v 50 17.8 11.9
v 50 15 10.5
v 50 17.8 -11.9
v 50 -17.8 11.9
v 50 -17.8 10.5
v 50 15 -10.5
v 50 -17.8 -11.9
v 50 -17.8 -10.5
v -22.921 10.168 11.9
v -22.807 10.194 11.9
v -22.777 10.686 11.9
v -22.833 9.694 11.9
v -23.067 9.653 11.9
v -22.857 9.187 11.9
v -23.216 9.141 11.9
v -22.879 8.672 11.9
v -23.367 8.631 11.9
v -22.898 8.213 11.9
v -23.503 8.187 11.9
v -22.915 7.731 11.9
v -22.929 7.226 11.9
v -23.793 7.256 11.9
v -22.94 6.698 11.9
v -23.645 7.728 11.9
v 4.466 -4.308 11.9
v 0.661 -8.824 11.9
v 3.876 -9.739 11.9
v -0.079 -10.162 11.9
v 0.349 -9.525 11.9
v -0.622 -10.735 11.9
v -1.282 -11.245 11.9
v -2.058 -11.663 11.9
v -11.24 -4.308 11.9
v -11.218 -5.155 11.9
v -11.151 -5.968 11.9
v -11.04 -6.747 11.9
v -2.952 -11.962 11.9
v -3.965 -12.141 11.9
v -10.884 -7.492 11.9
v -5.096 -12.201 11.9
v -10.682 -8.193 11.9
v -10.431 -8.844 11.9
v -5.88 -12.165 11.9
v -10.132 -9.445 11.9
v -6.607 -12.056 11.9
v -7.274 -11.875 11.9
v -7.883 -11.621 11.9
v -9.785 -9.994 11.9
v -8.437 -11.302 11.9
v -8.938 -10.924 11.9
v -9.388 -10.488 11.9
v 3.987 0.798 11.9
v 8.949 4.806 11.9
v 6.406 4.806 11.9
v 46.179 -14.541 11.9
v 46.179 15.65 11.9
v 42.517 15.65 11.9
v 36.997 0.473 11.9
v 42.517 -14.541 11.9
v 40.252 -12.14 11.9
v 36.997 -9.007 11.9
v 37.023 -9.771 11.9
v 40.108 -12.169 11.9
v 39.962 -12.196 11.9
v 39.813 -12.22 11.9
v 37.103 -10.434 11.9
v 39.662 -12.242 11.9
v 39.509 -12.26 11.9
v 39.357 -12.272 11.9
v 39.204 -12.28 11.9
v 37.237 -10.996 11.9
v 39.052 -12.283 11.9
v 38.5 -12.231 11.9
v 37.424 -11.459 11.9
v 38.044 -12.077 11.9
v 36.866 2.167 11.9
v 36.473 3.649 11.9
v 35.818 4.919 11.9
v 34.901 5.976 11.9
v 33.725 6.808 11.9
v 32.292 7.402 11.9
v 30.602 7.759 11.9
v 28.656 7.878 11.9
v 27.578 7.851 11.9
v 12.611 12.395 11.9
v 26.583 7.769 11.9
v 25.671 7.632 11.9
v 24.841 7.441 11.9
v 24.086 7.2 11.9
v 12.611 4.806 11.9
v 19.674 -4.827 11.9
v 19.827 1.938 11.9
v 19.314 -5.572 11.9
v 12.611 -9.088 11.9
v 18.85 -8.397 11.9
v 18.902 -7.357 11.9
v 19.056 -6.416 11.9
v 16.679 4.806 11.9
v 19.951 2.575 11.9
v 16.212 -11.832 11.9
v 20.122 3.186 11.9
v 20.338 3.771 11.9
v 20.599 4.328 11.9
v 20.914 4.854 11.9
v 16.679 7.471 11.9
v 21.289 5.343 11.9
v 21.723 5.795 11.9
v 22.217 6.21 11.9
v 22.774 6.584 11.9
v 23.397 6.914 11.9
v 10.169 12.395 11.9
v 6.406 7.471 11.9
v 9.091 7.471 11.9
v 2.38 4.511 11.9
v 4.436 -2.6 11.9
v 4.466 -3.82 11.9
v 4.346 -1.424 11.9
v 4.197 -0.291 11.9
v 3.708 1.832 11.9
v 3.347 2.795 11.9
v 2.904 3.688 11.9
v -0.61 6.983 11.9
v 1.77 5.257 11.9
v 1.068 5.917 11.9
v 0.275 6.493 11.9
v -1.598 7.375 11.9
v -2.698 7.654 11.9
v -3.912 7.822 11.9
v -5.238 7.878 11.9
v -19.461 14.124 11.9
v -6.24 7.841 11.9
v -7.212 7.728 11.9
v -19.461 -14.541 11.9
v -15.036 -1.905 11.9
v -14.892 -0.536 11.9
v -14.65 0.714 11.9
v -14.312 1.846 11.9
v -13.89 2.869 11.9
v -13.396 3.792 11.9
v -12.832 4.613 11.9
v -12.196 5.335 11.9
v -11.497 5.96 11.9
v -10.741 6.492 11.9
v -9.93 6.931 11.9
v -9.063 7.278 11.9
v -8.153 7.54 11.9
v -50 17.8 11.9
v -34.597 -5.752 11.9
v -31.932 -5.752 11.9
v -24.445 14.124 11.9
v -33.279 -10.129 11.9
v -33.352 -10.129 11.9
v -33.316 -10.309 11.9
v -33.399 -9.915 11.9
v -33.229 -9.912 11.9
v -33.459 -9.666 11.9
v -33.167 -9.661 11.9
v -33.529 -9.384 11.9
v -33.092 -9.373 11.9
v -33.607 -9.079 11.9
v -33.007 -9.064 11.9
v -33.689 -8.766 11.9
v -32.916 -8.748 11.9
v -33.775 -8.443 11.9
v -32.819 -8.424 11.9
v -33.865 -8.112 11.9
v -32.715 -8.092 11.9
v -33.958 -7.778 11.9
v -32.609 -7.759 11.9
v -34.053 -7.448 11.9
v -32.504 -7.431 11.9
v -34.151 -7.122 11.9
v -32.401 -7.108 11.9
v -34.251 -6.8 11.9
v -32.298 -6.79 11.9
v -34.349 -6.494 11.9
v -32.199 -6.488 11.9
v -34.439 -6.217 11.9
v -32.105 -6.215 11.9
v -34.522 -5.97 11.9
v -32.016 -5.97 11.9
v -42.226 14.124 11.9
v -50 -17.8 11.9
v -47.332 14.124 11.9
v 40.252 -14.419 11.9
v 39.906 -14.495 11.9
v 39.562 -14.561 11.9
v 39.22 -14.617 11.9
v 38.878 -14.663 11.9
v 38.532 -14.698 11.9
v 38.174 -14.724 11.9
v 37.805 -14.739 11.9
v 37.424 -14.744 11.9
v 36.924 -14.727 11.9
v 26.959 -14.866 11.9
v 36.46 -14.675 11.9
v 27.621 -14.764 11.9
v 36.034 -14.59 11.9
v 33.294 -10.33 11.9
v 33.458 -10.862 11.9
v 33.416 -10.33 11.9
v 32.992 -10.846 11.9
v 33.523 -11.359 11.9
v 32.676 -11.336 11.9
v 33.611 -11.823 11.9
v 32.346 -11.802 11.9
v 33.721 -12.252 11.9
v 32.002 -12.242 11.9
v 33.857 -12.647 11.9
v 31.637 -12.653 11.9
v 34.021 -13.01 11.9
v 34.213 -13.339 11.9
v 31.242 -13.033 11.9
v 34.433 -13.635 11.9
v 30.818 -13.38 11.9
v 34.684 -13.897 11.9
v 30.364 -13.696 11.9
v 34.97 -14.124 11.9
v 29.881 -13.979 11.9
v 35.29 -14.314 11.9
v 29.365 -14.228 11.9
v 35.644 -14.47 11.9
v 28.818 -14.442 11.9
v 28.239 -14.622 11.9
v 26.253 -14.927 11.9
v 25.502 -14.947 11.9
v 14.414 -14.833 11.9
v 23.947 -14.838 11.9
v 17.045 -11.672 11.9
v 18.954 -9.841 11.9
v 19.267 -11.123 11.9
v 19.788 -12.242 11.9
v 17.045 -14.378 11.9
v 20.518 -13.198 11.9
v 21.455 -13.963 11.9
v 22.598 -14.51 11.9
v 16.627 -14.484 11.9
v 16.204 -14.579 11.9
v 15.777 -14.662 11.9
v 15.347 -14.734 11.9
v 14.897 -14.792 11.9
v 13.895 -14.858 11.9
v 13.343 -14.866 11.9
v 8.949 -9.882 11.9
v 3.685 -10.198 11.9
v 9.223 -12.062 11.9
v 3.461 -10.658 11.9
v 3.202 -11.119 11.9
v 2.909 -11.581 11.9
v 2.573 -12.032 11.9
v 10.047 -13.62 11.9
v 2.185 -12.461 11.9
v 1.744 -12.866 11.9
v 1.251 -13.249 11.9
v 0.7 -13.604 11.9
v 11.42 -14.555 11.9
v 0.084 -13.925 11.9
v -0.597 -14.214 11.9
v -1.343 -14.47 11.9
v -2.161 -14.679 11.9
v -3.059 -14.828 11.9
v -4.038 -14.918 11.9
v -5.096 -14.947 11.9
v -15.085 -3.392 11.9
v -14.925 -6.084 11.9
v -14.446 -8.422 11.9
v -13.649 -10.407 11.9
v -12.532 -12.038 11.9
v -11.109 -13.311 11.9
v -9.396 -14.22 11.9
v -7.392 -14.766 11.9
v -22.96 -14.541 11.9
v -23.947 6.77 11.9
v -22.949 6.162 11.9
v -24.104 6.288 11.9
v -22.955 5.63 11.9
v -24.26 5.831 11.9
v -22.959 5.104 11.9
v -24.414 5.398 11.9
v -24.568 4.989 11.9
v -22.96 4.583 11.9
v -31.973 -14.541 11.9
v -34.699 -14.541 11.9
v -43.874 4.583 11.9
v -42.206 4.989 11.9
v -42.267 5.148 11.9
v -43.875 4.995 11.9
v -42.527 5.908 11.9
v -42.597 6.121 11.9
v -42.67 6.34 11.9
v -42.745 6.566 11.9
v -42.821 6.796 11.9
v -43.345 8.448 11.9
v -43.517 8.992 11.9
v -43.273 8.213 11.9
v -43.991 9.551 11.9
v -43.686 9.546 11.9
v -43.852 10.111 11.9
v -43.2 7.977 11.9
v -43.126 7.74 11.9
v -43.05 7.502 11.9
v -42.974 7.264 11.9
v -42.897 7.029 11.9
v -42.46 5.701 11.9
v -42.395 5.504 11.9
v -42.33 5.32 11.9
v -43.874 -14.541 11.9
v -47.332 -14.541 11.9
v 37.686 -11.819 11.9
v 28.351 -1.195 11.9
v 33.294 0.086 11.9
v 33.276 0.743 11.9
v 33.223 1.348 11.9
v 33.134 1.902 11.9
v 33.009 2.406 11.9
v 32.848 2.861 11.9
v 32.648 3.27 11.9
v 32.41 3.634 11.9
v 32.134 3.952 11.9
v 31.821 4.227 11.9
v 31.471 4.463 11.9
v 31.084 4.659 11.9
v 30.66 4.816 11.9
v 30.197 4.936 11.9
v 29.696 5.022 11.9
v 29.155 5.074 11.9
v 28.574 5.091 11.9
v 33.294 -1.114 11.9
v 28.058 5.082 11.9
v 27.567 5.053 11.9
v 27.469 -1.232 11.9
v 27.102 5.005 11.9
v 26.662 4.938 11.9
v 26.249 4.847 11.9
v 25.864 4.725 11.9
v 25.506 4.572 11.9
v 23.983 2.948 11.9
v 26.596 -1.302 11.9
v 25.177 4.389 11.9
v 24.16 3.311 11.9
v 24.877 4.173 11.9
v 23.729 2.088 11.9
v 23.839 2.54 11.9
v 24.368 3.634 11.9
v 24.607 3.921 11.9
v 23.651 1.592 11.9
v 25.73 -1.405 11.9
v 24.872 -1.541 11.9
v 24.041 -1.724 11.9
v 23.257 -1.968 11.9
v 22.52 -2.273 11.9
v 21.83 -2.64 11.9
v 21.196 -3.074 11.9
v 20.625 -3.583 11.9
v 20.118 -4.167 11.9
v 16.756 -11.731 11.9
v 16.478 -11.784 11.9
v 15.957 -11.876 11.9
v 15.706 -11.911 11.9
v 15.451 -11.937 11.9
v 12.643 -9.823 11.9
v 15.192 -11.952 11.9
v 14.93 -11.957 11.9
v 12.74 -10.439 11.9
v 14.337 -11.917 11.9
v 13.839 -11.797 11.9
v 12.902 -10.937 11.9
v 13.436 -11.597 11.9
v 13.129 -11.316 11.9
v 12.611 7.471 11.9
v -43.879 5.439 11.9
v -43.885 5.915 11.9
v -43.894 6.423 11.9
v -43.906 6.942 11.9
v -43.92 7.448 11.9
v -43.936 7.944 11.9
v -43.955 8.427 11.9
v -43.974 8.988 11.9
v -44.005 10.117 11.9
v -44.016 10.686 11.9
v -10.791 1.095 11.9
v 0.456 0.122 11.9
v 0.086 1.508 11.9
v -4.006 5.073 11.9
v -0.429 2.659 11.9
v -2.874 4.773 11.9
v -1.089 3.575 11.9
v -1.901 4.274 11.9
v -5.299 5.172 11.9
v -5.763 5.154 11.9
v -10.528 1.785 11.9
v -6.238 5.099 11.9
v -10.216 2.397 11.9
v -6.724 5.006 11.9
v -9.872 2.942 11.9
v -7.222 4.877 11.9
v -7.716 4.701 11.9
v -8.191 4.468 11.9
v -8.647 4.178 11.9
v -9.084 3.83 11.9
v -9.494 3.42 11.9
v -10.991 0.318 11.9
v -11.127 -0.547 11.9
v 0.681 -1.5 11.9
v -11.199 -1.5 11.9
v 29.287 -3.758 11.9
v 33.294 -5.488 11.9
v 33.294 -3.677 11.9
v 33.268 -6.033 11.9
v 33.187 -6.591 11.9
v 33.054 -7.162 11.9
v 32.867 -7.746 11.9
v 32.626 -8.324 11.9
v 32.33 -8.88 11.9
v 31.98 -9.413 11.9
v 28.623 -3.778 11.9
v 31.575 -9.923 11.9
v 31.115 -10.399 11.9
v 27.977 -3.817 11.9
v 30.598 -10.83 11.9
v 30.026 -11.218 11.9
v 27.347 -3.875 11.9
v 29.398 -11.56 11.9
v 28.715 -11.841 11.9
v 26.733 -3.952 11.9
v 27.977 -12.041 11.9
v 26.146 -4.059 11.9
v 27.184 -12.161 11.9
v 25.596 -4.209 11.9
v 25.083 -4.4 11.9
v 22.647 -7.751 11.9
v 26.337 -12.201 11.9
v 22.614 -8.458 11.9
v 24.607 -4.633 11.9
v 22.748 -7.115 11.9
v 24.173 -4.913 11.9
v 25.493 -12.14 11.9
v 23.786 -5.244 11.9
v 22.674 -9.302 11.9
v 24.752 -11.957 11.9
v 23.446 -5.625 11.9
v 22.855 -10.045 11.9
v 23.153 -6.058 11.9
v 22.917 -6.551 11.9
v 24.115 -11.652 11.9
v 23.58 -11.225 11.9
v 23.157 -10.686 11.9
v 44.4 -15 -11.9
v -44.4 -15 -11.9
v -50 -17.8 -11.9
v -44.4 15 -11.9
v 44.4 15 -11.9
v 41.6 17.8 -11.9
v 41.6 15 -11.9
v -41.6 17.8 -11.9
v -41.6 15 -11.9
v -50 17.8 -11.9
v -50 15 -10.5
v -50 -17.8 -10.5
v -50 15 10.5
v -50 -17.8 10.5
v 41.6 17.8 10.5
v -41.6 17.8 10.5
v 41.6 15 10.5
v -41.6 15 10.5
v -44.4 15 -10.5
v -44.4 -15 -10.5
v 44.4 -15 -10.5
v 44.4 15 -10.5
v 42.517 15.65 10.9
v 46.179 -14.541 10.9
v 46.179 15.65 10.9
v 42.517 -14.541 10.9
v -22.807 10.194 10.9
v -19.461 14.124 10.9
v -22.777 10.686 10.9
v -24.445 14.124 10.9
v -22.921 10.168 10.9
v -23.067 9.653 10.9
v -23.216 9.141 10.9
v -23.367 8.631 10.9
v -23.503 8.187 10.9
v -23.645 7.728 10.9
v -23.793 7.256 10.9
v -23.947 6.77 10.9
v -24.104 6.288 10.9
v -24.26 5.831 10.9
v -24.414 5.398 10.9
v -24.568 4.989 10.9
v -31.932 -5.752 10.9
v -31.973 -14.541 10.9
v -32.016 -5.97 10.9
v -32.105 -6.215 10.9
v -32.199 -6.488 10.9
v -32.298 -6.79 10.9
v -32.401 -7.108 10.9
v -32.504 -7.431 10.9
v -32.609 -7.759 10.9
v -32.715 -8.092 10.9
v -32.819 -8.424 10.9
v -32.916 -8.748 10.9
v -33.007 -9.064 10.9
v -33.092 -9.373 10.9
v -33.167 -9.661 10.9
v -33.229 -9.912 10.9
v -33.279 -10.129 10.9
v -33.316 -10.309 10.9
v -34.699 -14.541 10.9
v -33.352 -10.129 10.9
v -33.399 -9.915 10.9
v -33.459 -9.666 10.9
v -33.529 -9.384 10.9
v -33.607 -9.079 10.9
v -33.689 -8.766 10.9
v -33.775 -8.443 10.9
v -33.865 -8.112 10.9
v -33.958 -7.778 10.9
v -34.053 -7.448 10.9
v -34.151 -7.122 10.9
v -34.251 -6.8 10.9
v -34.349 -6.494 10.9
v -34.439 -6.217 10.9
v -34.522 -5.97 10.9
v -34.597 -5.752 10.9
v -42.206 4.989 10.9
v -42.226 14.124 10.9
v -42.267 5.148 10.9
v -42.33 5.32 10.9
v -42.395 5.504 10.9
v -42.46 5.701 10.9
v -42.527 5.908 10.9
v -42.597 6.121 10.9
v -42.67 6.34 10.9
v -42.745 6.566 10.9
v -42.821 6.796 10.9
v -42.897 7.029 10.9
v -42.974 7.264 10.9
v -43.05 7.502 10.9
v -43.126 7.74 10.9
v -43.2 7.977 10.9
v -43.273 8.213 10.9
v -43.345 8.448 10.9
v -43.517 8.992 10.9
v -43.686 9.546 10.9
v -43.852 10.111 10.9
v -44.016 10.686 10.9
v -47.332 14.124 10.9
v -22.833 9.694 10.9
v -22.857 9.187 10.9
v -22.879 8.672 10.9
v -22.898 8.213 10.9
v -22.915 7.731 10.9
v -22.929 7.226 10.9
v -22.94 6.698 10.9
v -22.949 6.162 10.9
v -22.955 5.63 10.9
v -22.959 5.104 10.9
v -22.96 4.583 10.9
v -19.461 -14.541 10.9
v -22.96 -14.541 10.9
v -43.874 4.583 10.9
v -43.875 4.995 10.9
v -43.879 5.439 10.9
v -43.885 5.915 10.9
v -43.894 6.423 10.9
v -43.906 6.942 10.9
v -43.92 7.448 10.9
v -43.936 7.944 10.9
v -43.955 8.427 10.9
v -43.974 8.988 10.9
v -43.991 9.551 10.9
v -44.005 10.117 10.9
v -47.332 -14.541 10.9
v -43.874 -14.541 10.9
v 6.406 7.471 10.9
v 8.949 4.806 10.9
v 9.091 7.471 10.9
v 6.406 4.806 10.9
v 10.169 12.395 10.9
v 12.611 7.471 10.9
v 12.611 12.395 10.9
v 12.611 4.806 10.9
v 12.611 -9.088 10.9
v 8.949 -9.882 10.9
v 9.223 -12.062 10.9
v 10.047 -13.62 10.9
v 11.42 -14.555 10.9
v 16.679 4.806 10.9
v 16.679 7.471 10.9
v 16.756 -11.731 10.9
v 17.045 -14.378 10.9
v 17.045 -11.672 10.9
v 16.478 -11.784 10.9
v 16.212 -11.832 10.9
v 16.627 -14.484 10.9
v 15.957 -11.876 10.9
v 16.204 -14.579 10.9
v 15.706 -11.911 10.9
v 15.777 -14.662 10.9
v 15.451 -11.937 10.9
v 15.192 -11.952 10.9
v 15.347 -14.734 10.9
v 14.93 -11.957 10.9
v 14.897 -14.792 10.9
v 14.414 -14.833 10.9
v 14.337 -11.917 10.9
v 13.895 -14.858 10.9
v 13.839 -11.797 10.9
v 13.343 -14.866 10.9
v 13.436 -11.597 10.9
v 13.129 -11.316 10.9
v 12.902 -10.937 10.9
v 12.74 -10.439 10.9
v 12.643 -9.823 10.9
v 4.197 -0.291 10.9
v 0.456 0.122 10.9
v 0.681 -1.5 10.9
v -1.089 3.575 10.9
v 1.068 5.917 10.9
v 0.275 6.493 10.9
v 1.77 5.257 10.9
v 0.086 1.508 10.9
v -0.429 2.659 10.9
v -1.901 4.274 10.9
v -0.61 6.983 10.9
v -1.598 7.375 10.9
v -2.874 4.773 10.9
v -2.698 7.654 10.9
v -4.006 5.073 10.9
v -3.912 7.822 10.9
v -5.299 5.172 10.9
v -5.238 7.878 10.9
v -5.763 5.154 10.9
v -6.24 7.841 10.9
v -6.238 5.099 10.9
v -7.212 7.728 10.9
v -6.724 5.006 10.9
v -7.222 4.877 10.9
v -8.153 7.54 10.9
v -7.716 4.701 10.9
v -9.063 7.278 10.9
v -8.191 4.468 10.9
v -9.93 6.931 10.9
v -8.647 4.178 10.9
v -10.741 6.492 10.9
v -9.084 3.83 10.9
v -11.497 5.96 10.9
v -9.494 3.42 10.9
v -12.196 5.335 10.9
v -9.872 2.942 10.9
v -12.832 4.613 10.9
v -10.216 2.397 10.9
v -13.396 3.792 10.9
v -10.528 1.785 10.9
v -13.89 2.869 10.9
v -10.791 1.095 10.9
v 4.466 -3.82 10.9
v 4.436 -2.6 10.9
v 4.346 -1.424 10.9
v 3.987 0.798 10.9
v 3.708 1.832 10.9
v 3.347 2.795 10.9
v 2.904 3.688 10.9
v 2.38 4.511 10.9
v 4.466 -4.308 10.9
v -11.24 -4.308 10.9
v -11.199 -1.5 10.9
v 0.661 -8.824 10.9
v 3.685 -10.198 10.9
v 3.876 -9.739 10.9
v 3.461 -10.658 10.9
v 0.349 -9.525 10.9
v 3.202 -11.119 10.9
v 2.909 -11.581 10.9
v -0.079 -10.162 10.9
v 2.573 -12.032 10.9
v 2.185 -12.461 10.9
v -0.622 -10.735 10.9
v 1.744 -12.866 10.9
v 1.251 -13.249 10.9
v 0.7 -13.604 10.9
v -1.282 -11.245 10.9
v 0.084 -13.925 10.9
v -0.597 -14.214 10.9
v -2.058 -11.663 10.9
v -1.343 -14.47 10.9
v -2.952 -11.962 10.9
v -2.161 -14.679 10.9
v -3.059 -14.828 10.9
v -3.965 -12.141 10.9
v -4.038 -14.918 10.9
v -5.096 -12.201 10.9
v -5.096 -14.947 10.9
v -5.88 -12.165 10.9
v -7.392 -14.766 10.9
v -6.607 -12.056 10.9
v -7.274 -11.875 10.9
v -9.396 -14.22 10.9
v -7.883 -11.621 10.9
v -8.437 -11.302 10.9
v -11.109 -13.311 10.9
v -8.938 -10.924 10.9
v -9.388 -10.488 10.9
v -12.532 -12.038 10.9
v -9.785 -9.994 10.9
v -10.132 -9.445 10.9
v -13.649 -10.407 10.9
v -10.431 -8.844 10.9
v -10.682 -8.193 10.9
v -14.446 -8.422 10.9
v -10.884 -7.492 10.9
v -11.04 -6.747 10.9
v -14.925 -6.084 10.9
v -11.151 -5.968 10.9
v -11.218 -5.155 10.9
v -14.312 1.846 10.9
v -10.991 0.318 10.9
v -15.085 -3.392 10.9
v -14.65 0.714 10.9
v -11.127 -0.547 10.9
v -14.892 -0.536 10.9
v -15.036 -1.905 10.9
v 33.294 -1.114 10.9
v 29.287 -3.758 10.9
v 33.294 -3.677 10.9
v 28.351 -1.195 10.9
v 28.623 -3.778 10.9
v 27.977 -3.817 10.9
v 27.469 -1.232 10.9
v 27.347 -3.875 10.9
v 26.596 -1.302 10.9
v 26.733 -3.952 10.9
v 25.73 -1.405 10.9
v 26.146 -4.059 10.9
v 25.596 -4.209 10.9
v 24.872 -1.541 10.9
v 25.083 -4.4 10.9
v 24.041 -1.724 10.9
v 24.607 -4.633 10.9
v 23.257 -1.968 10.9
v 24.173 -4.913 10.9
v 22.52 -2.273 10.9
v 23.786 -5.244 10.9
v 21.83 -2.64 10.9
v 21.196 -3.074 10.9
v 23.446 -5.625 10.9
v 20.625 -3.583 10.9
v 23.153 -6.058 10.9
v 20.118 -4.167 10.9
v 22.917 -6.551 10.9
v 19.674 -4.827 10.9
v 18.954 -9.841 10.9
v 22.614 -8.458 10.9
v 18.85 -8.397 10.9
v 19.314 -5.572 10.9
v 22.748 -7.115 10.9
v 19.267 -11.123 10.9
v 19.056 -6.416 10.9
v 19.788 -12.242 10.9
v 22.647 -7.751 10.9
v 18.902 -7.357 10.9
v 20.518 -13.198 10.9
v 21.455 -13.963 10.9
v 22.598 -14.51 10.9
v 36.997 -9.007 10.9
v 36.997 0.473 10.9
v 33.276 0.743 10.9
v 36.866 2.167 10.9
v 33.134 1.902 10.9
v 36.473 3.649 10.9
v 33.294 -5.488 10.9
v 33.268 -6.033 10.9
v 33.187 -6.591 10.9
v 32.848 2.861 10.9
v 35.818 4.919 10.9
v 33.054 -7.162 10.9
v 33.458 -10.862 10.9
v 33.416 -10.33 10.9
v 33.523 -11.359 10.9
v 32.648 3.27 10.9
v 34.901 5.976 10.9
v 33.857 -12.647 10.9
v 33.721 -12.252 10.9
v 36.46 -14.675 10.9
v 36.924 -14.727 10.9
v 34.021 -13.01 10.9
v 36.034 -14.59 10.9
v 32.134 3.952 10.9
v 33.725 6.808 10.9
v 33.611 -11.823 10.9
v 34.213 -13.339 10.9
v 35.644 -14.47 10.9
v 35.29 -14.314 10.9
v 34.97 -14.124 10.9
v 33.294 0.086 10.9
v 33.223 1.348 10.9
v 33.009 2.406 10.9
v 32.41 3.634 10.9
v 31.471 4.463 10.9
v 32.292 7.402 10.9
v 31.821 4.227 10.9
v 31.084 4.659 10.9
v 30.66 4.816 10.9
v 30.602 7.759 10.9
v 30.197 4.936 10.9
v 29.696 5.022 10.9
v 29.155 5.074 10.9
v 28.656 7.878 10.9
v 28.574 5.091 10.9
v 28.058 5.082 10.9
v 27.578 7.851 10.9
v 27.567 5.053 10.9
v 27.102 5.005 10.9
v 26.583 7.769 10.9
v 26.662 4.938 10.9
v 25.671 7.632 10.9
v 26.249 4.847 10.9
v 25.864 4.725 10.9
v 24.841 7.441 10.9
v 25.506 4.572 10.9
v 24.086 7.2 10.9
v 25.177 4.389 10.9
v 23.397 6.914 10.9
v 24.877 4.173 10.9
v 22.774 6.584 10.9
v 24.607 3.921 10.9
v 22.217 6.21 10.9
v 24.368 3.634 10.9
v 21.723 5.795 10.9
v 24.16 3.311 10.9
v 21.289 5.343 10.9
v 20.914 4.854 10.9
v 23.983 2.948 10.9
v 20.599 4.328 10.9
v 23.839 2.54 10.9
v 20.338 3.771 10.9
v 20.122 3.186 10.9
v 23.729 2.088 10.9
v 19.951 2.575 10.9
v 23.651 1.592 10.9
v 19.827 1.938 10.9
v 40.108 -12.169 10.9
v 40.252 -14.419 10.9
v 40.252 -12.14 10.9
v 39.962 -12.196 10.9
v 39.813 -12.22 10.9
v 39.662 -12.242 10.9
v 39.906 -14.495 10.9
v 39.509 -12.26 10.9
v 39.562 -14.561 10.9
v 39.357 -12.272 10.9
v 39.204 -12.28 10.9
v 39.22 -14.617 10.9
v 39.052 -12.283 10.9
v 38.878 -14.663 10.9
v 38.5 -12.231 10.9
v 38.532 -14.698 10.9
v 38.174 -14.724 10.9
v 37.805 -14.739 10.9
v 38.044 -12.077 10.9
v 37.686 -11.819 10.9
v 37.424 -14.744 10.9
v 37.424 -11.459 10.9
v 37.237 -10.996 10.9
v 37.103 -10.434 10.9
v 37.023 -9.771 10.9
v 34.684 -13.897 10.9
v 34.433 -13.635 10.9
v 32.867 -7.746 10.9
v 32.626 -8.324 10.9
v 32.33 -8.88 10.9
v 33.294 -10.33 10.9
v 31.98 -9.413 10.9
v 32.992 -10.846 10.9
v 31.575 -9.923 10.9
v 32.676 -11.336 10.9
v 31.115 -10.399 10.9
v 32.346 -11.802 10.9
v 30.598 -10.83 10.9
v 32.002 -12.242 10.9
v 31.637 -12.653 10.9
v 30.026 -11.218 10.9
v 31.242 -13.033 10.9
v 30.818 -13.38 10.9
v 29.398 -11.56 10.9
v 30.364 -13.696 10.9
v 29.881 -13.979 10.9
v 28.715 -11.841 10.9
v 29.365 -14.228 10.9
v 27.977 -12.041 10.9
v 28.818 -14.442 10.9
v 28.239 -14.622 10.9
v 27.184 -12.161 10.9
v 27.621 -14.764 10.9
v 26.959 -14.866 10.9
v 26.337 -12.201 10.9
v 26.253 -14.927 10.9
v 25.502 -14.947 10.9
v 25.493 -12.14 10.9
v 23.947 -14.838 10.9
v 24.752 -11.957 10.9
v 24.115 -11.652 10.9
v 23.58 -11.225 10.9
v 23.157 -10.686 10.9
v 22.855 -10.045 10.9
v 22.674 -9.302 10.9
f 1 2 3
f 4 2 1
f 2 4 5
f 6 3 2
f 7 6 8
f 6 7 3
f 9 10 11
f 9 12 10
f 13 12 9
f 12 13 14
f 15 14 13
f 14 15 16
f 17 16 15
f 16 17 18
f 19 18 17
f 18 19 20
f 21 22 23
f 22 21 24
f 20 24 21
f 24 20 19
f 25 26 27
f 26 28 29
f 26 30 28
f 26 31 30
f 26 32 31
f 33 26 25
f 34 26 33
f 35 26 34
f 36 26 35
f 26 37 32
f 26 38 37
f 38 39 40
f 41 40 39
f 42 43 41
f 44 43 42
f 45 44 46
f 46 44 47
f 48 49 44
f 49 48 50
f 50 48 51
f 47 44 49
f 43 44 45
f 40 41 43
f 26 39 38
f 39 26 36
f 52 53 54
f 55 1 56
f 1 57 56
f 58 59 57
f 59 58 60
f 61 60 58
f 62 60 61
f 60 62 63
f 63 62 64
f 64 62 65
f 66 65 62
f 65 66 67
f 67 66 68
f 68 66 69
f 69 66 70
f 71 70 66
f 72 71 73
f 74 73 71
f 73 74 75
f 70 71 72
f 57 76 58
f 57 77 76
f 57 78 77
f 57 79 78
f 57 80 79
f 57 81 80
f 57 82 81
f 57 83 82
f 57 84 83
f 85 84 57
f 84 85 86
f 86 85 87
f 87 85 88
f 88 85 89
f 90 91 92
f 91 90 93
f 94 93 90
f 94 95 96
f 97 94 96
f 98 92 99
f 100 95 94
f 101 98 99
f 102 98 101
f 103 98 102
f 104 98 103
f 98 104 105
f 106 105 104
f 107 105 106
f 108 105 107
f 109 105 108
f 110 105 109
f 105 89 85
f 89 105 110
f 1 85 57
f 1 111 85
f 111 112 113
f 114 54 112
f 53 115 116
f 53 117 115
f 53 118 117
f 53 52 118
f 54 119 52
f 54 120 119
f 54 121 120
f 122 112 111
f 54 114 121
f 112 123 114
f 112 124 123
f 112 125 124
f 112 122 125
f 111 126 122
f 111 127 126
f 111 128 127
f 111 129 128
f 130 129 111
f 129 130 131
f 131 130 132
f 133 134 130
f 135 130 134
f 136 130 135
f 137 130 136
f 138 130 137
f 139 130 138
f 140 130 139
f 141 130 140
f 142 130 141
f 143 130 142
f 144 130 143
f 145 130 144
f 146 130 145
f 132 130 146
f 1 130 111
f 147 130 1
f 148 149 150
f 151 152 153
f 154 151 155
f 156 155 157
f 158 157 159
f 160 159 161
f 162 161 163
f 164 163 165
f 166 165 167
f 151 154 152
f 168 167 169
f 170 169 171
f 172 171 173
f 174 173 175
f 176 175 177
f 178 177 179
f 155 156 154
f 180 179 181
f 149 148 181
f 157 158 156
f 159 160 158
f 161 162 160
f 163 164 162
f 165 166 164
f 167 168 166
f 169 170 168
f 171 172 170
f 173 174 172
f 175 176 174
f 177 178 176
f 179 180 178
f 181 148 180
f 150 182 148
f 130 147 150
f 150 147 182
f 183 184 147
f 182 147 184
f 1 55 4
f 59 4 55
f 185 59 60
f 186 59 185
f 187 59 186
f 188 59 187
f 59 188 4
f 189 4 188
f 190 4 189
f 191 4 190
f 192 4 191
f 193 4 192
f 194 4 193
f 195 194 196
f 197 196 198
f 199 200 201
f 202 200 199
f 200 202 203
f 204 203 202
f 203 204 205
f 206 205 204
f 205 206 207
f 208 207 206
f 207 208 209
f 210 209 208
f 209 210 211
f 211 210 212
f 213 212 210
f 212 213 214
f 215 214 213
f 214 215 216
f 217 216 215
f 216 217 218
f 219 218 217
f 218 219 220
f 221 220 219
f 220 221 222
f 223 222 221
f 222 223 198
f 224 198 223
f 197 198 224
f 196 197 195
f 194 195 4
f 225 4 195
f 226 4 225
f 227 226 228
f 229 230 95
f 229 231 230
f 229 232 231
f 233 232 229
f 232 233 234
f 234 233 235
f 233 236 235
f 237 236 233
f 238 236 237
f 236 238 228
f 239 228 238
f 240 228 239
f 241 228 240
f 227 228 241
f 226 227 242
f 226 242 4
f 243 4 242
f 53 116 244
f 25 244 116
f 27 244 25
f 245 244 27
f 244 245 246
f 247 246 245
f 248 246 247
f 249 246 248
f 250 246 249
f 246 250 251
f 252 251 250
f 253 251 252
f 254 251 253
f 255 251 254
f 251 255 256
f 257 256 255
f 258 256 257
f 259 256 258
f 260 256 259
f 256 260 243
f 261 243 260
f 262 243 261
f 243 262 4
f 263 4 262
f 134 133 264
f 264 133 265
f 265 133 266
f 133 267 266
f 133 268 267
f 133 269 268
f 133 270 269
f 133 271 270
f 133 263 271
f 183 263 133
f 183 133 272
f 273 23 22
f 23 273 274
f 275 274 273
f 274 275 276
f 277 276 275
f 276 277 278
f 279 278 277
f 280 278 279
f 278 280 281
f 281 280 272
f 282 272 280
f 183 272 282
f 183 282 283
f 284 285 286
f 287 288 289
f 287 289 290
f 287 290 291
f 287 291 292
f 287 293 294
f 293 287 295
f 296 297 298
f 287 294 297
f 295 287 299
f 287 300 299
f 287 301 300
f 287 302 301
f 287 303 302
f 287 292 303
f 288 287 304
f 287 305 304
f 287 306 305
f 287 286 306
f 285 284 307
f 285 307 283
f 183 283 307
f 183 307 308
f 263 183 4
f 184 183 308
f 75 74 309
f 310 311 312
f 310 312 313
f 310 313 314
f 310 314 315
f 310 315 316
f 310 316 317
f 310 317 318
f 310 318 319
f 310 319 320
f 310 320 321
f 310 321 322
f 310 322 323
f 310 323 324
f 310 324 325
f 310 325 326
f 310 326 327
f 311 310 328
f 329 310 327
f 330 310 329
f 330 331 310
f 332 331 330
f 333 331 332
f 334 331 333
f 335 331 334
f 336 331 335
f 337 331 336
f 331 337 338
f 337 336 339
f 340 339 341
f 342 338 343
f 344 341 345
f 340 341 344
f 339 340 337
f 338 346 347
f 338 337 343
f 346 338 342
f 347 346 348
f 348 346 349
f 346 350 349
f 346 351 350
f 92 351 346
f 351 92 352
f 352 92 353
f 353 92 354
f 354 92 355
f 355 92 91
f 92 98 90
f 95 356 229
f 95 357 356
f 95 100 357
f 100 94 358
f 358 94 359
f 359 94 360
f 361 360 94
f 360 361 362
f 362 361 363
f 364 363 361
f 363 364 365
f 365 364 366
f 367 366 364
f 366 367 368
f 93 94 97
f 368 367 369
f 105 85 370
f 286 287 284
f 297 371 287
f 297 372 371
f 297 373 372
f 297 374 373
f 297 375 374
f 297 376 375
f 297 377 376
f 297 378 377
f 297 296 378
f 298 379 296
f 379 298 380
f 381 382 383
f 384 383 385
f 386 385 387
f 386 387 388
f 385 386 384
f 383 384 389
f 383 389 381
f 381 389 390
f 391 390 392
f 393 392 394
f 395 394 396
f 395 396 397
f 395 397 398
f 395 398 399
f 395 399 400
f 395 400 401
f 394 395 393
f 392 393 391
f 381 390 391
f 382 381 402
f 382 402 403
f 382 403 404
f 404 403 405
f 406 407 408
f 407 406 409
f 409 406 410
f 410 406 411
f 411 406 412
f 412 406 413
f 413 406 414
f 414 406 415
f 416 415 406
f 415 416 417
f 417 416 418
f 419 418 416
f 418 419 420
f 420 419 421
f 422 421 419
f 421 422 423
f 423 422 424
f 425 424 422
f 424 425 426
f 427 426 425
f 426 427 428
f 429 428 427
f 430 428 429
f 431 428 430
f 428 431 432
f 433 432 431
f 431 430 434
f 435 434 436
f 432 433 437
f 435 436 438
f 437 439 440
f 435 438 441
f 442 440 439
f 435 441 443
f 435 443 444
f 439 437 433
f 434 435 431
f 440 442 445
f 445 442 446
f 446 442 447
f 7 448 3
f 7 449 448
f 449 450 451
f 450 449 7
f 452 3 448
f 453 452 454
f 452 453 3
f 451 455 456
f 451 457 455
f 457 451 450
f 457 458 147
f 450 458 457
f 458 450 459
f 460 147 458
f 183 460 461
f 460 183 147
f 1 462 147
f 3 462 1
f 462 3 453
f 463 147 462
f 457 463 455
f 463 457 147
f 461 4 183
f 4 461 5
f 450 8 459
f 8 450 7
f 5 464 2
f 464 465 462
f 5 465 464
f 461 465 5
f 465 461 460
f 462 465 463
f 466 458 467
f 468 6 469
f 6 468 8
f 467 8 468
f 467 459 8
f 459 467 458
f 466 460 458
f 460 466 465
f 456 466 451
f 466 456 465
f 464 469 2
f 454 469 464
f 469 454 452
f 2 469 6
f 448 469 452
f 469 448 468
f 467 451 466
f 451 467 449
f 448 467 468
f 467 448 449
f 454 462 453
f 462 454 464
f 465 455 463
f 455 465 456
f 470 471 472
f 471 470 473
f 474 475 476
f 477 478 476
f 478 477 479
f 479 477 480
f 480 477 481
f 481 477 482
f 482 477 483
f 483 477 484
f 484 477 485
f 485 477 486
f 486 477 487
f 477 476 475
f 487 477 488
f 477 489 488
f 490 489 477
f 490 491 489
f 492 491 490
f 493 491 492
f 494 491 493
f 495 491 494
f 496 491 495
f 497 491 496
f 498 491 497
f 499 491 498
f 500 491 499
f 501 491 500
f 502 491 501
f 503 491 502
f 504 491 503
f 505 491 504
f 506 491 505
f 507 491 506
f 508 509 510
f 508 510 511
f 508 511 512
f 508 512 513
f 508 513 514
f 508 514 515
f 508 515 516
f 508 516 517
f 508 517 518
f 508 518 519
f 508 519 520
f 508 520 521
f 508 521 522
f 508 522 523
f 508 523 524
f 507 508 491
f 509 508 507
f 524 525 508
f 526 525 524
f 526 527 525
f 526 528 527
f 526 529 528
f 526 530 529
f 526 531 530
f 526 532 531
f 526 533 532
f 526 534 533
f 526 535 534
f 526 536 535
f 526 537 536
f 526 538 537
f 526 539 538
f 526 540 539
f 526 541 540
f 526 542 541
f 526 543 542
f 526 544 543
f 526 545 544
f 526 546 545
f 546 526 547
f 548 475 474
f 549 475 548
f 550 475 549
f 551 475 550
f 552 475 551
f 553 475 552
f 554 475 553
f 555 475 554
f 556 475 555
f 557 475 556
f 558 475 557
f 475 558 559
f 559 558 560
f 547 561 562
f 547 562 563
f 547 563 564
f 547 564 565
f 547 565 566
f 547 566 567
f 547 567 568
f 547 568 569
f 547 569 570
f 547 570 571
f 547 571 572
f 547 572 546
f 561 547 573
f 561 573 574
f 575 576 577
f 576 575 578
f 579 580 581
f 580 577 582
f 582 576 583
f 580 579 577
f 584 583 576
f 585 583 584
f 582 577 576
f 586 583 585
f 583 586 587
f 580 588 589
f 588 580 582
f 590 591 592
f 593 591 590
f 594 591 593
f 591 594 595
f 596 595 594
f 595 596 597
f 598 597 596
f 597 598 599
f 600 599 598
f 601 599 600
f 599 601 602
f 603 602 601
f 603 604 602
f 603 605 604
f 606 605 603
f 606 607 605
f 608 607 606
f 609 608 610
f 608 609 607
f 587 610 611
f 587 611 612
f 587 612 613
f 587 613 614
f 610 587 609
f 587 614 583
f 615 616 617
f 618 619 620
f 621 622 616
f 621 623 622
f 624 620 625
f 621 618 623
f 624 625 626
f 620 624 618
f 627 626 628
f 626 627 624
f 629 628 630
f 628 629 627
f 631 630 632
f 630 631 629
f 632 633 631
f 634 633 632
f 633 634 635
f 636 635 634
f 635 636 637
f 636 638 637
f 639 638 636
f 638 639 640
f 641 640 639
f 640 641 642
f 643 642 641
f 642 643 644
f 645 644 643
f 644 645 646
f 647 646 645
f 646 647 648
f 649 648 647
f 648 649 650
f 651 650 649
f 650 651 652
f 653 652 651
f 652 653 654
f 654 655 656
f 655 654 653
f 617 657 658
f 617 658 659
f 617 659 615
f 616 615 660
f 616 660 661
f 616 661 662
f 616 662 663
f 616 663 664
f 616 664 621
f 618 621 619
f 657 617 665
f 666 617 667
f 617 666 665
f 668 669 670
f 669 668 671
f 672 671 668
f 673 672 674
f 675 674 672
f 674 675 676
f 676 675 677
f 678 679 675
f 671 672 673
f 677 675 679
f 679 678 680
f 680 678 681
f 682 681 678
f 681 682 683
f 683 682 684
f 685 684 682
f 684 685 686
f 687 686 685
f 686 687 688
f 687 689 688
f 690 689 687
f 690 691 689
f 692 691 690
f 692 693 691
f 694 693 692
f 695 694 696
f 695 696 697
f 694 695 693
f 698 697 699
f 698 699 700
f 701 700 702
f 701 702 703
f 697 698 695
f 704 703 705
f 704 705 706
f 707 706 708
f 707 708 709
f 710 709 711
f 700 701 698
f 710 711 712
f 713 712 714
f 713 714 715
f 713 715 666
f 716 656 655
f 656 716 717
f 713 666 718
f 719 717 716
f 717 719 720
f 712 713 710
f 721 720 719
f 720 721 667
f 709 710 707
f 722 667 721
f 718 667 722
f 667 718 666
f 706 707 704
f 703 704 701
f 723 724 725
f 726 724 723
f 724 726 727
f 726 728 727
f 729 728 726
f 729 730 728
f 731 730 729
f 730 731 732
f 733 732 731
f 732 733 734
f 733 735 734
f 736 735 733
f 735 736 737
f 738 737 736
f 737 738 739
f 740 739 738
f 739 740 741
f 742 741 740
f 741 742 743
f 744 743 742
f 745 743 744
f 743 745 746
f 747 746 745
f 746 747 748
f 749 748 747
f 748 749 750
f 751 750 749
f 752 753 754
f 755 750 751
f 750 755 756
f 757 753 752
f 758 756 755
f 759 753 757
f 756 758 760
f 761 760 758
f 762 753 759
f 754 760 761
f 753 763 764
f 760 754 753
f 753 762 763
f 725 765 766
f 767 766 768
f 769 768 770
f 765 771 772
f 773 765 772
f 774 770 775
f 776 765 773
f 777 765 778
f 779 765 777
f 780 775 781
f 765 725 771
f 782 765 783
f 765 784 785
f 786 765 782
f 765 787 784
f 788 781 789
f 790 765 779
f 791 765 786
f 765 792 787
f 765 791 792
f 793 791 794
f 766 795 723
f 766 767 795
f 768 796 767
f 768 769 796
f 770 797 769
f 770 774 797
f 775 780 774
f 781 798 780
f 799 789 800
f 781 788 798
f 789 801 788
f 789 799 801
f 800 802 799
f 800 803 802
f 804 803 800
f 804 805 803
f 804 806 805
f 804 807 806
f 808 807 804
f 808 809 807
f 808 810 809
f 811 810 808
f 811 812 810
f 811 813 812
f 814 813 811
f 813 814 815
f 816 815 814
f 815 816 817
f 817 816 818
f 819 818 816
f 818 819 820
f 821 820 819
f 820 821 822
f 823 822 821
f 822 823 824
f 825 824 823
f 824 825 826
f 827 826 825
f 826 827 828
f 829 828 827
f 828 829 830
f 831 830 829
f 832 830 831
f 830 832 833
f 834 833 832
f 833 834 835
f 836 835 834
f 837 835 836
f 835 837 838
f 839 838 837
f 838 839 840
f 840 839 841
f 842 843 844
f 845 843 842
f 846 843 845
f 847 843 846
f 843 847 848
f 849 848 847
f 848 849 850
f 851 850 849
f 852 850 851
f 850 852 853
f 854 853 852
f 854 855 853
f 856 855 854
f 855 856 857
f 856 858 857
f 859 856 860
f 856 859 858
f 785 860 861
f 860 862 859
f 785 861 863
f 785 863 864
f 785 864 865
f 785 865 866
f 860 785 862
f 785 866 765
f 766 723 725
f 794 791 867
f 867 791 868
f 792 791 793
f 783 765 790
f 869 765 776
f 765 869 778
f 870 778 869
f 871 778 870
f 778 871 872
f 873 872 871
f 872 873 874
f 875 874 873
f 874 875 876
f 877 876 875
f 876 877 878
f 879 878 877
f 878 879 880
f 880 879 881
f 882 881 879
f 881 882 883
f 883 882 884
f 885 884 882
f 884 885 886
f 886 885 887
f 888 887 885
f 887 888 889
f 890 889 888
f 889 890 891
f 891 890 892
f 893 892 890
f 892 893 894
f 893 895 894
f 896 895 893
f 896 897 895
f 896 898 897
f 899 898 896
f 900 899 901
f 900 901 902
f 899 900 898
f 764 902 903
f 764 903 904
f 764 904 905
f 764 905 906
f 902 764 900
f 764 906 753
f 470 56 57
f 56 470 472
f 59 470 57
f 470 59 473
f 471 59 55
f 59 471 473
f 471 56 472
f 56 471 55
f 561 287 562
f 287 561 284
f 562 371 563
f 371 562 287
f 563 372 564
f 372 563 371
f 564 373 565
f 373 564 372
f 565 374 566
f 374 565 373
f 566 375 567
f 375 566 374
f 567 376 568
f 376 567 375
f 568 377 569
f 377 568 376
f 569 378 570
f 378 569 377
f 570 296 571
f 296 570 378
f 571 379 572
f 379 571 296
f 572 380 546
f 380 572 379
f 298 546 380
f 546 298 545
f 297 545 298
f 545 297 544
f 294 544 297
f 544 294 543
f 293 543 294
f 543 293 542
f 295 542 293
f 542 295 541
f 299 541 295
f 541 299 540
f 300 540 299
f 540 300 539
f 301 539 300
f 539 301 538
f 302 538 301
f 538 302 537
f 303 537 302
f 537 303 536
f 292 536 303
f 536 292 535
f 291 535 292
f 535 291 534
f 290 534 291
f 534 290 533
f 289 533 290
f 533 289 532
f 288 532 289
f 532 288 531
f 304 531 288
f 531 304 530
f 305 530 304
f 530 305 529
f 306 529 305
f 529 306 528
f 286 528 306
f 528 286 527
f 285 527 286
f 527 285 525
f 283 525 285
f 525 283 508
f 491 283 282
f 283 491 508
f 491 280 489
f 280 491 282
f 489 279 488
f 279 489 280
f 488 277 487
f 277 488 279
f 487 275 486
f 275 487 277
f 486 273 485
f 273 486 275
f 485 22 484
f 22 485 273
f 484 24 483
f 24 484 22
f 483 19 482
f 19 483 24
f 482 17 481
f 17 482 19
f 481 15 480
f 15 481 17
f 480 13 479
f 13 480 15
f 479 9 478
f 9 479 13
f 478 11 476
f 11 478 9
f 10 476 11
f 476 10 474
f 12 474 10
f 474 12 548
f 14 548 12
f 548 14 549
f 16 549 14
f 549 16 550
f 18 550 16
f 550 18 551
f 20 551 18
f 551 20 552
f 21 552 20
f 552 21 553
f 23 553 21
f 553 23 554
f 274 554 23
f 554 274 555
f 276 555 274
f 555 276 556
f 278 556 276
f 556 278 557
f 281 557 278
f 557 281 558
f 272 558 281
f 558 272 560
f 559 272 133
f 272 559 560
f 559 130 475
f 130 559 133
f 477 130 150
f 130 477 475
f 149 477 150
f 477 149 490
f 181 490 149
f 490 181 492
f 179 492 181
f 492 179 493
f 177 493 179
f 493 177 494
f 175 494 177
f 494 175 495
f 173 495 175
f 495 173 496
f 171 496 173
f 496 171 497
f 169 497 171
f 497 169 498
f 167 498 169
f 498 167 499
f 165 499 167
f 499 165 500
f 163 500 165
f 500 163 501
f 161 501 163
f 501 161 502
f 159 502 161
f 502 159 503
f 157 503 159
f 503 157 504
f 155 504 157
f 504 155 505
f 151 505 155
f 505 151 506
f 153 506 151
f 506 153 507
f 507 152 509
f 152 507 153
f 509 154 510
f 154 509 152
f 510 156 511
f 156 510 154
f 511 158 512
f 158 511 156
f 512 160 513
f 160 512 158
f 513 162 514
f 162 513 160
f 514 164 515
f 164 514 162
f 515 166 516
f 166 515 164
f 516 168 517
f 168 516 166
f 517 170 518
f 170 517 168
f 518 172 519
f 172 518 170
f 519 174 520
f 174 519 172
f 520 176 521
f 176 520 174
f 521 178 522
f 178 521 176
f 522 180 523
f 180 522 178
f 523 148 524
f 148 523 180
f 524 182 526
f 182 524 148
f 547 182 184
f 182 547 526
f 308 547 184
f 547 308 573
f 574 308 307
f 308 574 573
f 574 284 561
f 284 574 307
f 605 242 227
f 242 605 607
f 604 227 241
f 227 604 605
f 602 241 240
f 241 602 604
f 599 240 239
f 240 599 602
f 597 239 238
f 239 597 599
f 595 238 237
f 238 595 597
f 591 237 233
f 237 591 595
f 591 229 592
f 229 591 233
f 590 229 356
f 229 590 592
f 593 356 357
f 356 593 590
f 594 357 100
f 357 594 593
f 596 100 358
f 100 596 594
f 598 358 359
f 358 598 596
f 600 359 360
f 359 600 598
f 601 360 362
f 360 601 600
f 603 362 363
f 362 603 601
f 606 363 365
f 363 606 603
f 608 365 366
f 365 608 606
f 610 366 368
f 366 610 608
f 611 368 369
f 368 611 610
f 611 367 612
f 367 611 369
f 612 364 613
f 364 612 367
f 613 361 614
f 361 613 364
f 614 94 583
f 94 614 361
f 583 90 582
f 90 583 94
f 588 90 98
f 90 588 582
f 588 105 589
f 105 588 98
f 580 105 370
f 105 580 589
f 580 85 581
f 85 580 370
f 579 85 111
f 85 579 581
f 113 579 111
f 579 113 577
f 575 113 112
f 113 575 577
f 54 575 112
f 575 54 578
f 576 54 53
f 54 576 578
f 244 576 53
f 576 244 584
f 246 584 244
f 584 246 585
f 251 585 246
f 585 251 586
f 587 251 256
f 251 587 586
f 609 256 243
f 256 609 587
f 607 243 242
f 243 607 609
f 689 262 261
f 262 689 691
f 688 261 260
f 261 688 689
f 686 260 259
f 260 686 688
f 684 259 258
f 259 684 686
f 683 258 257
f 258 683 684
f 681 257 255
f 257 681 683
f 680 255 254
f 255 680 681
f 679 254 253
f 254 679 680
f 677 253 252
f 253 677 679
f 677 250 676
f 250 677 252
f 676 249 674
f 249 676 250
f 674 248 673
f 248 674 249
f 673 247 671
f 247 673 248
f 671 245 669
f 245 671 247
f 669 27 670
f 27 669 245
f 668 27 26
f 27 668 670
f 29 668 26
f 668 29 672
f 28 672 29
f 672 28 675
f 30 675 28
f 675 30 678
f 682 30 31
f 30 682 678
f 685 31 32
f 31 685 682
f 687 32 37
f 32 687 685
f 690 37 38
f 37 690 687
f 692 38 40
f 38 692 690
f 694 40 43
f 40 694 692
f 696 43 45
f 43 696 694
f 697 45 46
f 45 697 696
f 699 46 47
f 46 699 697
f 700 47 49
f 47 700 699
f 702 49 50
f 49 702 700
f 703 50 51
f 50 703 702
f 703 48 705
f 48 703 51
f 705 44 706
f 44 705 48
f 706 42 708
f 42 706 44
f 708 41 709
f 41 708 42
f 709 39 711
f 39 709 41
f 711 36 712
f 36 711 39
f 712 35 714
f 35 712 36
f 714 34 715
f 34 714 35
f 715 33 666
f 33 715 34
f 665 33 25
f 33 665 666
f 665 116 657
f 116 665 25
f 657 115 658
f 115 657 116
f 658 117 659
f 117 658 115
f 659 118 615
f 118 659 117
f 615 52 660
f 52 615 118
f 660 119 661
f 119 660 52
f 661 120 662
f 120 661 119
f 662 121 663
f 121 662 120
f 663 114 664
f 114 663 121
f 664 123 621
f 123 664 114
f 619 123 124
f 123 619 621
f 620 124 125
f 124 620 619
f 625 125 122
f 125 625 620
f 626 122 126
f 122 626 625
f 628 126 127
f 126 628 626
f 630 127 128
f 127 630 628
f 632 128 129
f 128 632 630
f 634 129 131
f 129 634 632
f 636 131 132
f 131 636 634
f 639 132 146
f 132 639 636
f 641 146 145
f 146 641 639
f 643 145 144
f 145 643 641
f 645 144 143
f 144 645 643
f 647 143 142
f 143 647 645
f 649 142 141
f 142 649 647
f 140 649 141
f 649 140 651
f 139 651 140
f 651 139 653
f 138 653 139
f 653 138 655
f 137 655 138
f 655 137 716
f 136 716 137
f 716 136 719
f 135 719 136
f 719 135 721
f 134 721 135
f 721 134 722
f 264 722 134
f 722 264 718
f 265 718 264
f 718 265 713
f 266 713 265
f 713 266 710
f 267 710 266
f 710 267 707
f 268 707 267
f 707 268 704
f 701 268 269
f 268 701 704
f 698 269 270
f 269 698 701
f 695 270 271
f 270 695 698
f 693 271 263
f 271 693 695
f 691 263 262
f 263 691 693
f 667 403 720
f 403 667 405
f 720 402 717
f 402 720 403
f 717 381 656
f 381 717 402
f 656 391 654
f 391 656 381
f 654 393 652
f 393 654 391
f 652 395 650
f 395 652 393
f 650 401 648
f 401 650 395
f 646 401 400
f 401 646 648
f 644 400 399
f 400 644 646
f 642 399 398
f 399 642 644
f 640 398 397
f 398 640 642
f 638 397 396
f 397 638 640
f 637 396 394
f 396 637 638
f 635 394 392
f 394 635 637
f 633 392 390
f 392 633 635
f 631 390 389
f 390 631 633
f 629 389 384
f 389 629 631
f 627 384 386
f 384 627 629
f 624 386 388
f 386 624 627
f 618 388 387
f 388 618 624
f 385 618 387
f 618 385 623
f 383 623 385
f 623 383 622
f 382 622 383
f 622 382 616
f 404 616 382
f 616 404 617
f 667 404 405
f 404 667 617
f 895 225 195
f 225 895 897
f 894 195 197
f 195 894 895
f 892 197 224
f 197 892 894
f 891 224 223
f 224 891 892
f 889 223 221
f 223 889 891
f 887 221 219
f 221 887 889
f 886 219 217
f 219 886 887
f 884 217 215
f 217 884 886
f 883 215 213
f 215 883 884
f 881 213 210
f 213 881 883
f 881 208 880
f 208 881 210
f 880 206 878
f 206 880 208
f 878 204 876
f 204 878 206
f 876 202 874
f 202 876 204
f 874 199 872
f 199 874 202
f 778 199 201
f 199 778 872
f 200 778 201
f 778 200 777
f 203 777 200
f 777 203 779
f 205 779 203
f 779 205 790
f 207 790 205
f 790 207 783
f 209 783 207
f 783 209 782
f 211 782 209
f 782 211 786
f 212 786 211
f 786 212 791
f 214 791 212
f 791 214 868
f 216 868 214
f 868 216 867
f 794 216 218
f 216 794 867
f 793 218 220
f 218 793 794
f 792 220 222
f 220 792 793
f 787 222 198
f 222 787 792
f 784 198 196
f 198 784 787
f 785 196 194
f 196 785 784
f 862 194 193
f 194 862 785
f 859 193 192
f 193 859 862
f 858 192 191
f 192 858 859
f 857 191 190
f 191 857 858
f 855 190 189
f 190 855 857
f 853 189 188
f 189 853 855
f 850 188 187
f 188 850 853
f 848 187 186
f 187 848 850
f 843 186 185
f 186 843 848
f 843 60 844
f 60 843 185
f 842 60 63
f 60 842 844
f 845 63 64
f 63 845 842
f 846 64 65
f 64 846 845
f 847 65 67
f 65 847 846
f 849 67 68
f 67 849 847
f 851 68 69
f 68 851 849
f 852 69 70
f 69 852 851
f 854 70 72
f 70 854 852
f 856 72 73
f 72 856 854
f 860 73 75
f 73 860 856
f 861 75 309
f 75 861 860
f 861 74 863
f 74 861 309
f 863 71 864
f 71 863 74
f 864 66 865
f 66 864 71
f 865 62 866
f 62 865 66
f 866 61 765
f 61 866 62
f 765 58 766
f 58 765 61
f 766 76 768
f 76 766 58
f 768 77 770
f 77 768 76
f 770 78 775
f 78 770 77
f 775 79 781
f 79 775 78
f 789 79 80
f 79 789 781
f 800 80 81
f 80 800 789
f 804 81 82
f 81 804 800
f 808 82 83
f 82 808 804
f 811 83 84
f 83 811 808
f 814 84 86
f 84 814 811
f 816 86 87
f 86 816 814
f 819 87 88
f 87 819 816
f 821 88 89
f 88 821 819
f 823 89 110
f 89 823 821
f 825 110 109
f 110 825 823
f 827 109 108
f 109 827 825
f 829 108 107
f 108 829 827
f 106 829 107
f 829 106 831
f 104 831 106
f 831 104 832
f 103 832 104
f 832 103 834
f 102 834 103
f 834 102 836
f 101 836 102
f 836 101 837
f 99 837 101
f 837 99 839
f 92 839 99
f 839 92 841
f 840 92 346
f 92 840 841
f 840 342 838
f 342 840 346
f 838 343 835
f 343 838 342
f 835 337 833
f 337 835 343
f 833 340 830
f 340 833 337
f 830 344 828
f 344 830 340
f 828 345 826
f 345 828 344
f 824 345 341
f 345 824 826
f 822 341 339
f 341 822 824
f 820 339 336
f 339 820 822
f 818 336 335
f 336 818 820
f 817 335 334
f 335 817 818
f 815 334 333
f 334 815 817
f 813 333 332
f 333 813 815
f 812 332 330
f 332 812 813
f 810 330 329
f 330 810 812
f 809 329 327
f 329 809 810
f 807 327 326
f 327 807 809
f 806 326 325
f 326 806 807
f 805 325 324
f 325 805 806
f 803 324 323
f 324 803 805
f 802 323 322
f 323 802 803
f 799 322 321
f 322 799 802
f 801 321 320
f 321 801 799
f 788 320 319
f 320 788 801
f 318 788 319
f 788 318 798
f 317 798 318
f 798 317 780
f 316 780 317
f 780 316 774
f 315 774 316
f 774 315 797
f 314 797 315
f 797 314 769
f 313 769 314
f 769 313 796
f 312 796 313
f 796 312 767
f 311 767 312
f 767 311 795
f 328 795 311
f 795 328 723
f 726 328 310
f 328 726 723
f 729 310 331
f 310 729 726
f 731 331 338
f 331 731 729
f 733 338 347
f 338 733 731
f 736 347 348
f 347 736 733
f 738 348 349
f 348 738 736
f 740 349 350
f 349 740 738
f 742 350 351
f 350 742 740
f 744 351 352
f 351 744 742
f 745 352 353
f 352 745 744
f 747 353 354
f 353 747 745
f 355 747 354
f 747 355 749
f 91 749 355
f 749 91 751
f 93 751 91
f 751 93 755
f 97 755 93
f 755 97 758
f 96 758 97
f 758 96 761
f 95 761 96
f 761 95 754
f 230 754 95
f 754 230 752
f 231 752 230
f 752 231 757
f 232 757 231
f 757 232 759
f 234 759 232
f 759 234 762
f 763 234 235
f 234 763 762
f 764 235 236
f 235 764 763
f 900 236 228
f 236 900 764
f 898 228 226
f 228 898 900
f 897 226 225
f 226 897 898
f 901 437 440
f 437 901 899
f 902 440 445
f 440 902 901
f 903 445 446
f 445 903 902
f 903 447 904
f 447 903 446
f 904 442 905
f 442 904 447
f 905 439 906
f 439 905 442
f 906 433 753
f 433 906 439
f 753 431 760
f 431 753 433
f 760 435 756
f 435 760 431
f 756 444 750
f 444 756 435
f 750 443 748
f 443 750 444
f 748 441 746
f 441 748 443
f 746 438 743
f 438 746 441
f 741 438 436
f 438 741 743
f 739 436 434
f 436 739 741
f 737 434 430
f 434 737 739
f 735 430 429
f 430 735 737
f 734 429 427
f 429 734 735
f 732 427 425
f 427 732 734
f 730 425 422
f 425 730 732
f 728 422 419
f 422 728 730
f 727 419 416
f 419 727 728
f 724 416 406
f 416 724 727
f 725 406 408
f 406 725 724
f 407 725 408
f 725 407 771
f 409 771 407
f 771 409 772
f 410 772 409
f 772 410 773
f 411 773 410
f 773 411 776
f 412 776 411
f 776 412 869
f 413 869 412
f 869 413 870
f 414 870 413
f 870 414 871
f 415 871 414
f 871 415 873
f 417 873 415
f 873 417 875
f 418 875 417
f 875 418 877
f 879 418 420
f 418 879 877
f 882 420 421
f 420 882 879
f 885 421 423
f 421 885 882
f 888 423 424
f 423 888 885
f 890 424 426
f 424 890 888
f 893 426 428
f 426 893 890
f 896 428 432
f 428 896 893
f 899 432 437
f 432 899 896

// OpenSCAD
/*[Global]*/

//The length of the sign
sign_length=100; // [300]

//Text size
text_size=30; // [100]

//Thickness of the sign
thickness=2.8;	

//Thickness of the door
door_thickness=21;

//Text
sign_text="Metal";

//Make the sign face down for easier printing
Face_down=0; //[0:False, 180:True]


rotate([Face_down,0,0])
difference(){
	cube([sign_length, text_size+ thickness*2, door_thickness+thickness], center=true);
	translate([0,-thickness,0])
		cube([sign_length+thickness*2, text_size+thickness*2, door_thickness], center=true);
	translate([0,0,-(door_thickness+thickness)/2])
		cube([sign_length-thickness*4, text_size, thickness+0.2], center=true);
	translate([0,(text_size+thickness)/2,-(thickness+0.1)/2])
		cube([sign_length-thickness*6, thickness+0.2, door_thickness+ thickness+0.1], center=true);
translate([-1,0,(door_thickness+thickness)/2+0.4])
	linear_extrude(height=thickness, center=true, convexity=10, twist=0) 
		text(sign_text,size=text_size, halign="center",valign="center");
}
